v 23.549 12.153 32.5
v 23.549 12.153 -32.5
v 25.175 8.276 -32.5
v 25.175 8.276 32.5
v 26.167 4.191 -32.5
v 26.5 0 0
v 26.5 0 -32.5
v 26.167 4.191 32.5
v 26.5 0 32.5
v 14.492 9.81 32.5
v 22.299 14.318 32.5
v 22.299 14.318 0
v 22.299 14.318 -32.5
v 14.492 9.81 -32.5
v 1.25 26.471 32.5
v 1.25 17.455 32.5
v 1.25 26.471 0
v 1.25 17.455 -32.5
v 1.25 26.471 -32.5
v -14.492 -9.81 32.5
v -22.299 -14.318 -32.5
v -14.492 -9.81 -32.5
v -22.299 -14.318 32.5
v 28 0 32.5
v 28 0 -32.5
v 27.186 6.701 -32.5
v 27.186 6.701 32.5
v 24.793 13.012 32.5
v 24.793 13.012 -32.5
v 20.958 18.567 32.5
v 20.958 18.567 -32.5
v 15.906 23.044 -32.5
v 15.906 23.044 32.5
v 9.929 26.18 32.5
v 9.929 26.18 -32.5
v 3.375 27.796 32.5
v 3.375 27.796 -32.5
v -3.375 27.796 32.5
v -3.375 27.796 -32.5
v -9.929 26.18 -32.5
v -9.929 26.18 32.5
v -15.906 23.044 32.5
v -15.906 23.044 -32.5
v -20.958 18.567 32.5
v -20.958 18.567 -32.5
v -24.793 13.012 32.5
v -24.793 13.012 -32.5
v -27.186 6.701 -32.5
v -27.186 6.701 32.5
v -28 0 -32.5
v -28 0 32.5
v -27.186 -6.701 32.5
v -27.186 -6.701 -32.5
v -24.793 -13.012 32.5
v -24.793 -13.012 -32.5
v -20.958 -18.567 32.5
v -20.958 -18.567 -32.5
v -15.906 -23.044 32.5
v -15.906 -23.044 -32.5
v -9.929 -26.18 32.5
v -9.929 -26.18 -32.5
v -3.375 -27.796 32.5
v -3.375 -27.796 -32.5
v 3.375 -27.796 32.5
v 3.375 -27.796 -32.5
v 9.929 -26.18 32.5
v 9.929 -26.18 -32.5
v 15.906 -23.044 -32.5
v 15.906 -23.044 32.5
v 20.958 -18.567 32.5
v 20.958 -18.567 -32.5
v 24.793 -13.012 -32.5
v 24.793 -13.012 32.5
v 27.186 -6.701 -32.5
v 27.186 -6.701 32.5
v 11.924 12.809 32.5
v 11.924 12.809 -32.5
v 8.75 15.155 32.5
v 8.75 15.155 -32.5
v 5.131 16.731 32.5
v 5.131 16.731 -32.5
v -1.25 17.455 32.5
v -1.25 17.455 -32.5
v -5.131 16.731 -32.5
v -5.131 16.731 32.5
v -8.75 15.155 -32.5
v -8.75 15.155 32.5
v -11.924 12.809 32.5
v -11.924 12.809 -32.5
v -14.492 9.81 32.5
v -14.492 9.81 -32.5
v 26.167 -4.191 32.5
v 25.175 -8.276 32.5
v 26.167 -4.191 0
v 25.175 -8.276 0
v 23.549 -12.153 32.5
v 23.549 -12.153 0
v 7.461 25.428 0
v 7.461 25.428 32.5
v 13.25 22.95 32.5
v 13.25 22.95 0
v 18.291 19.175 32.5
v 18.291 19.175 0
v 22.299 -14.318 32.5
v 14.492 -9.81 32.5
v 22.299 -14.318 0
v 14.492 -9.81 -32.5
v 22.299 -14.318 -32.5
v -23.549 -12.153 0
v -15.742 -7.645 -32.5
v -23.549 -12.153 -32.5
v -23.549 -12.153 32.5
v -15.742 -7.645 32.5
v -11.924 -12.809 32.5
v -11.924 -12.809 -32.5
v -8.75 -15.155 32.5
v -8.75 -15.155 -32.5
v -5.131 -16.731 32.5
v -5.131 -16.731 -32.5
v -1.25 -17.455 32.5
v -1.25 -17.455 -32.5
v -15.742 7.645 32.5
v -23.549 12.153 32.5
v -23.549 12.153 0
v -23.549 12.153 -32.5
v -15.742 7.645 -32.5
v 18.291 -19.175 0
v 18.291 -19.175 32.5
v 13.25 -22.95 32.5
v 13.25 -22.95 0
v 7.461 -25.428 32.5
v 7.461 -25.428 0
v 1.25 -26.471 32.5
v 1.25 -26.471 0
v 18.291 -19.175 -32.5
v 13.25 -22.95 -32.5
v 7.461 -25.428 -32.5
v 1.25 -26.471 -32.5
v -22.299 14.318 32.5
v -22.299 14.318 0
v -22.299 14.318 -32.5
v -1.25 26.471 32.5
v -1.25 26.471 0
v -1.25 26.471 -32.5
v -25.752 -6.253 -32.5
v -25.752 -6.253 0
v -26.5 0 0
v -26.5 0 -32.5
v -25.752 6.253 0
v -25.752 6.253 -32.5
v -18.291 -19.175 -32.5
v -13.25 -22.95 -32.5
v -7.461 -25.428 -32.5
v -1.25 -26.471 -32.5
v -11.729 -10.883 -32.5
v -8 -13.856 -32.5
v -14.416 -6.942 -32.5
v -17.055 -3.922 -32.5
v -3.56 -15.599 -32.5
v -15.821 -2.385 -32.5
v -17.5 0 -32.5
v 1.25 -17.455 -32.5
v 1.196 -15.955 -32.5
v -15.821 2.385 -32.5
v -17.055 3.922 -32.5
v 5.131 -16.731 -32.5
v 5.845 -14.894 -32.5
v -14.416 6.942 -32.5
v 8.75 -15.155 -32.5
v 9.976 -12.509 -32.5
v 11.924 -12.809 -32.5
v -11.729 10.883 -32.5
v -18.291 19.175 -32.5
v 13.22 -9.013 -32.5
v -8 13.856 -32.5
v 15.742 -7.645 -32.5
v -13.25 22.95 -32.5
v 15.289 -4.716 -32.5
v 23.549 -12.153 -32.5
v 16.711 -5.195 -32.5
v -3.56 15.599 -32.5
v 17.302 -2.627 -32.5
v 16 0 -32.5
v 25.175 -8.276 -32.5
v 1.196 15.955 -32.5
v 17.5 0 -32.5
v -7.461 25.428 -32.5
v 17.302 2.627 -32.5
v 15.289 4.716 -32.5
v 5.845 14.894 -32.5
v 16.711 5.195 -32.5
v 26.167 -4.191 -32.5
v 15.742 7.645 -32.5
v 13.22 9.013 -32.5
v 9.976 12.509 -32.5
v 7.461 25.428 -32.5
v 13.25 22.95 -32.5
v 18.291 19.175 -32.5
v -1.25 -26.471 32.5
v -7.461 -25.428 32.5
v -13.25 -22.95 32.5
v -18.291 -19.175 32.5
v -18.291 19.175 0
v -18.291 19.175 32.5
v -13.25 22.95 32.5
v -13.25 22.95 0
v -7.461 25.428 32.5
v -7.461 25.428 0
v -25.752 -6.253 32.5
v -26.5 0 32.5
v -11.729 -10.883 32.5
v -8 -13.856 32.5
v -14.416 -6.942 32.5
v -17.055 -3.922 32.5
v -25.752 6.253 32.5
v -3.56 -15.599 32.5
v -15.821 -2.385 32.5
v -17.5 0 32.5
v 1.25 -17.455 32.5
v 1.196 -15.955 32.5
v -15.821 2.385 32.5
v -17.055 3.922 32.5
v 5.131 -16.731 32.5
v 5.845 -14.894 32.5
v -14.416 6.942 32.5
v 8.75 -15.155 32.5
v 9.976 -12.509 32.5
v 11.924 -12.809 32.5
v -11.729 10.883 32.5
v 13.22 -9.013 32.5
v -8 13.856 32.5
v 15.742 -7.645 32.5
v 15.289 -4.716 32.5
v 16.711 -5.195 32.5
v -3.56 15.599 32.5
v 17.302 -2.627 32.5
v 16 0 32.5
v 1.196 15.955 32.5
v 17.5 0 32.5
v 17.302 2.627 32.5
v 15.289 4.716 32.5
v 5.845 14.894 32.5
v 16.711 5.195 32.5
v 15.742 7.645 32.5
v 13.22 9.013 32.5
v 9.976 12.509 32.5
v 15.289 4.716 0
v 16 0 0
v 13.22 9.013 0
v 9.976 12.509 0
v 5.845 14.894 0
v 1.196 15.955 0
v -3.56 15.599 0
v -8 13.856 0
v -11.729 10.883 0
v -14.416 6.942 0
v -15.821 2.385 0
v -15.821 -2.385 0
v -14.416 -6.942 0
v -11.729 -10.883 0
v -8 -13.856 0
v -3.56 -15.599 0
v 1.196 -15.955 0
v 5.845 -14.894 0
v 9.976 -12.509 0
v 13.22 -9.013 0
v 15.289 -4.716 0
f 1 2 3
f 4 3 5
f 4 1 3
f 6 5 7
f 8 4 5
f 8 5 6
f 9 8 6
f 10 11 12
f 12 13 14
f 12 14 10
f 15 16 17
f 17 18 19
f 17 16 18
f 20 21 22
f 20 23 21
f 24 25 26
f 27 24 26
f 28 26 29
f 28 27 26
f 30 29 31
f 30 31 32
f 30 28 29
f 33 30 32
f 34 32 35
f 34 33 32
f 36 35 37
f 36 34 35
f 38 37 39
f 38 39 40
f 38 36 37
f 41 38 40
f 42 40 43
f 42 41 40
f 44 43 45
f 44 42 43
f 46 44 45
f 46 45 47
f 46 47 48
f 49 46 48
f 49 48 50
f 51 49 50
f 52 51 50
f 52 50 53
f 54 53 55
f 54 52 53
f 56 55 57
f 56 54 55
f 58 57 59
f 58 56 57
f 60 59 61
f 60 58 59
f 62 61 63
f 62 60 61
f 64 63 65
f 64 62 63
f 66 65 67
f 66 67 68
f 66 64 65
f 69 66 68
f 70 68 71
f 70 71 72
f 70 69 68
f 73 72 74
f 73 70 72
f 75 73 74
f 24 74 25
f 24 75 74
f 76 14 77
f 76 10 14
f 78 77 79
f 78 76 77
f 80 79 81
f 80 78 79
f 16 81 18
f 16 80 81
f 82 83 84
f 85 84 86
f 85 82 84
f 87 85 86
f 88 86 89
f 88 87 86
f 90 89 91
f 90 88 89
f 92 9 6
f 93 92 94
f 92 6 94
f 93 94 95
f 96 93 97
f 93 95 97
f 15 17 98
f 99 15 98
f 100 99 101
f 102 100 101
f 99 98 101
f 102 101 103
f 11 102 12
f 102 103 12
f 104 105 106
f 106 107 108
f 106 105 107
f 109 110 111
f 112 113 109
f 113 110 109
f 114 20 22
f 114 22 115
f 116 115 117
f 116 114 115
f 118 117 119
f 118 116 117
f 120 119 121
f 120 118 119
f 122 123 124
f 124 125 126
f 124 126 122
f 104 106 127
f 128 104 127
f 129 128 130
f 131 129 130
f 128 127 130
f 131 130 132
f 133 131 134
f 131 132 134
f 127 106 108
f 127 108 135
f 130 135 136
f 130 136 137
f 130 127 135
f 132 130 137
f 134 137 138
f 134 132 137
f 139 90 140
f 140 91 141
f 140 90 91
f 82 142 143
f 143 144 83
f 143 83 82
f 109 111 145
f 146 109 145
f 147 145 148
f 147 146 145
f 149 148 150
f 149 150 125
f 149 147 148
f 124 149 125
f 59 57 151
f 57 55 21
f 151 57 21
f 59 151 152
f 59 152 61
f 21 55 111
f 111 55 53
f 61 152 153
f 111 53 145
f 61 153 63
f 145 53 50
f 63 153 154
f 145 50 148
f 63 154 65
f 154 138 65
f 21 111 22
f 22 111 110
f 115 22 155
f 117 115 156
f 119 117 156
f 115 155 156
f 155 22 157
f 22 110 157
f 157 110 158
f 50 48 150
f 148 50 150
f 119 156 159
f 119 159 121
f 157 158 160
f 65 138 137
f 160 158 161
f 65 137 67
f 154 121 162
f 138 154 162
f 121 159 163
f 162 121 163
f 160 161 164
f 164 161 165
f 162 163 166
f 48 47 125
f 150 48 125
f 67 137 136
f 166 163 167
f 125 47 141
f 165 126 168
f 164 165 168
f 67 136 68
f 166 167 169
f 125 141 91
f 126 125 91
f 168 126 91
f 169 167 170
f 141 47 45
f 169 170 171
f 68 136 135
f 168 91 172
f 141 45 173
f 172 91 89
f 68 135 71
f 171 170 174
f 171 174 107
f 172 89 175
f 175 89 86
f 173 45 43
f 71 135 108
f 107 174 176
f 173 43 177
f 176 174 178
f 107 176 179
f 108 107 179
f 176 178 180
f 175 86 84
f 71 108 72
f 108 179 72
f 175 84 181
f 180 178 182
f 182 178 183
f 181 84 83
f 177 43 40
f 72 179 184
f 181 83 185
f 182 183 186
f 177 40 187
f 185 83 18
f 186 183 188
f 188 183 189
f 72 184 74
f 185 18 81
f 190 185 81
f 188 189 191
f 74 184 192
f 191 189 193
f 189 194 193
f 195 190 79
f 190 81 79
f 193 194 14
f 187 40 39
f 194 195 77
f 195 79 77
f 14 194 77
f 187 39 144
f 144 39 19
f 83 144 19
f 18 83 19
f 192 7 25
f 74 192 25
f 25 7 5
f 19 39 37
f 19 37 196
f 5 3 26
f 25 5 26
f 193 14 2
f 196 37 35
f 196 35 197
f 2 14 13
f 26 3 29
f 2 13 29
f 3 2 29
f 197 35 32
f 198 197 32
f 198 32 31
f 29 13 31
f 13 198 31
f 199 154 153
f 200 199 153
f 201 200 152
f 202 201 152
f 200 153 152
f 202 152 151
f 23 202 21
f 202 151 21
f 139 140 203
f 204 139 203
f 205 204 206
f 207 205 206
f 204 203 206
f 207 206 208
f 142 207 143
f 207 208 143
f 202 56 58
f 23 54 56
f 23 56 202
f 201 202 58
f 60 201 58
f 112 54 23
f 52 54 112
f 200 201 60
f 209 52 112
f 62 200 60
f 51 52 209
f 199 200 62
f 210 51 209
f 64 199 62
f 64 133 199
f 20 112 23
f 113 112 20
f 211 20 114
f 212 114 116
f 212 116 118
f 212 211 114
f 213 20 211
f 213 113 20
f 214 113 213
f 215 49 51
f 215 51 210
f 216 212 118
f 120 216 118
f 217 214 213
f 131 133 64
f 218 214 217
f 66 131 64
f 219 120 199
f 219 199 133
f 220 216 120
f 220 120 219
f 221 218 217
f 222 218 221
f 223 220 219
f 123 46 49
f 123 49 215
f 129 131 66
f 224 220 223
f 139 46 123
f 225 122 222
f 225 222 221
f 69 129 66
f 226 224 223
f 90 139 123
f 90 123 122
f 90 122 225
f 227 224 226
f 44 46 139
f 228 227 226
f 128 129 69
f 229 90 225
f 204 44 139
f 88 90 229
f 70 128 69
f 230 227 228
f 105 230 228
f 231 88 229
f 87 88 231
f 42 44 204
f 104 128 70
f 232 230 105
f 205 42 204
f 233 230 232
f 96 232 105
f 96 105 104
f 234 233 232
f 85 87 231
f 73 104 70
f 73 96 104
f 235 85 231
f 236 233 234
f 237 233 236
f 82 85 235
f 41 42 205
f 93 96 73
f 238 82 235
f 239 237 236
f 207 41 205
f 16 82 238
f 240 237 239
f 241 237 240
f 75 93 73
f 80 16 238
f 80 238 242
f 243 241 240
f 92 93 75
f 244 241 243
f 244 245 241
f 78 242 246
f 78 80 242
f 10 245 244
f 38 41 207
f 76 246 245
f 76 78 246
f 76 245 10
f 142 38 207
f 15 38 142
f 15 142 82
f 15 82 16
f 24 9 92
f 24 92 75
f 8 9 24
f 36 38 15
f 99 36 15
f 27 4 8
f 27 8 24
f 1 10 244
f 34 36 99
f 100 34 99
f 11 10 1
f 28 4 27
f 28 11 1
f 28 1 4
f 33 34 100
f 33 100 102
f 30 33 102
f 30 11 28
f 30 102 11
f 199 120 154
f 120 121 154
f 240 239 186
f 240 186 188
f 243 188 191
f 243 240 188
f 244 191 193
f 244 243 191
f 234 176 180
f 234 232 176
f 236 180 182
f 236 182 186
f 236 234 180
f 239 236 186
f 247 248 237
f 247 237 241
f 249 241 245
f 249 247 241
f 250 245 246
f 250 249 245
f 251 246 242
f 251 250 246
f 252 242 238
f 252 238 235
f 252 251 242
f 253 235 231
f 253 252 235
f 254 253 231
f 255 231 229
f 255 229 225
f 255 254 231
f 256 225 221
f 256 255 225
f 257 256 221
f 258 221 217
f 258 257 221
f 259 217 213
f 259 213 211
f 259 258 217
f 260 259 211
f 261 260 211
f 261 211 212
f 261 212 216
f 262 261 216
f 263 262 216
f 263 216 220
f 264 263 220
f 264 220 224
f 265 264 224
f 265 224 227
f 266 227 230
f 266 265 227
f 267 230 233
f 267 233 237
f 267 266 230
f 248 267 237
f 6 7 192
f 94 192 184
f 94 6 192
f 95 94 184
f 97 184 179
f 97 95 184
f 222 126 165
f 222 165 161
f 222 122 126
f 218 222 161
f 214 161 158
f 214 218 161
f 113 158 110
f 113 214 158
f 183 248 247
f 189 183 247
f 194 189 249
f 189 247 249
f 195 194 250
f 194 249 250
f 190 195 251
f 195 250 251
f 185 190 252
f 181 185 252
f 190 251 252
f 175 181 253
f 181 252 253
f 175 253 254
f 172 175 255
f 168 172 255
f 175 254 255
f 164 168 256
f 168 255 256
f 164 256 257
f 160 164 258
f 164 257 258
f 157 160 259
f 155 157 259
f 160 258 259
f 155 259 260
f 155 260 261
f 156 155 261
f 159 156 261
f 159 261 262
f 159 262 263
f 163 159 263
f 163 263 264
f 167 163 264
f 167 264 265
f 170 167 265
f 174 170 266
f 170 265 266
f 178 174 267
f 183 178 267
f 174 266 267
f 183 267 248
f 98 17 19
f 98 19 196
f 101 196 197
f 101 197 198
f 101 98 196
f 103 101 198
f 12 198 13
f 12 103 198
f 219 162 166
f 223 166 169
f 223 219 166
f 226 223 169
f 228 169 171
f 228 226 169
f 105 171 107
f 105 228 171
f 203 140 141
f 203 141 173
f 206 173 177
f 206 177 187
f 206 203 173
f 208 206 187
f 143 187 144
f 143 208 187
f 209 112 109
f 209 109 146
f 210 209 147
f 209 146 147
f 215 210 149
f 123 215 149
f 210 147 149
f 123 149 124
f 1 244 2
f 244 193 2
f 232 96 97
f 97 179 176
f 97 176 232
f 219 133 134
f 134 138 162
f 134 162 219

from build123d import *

# Parameters (mm, degrees)
F0_R     = 16
F1_DEPTH = 32.5
F0_R_2   = 28
F2_DEPTH = 32.5


with BuildPart() as f1:
    # F0 (on Top) → F1 (new body, symmetric)
    with BuildSketch(Plane.XY):
        with BuildLine():
            ThreePointArc((15.7417332781, -7.6451182726), (17.0547696022, -3.9223505474), (17.5, 0))
            ThreePointArc((17.5, 0), (17.0547696022, 3.9223505474), (15.7417332781, 7.6451182726))
            ThreePointArc((15.7417332781, 7.6451182726), (15.1554445662, 8.75), (14.4917332781, 9.8101817821))
            ThreePointArc((14.4917332781, 9.8101817821), (8.75, 15.1554445662), (1.25, 17.4553000547))
            ThreePointArc((1.25, 17.4553000547), (0, 17.5), (-1.25, 17.4553000547))
            ThreePointArc((-1.25, 17.4553000547), (-8.75, 15.1554445662), (-14.4917332781, 9.8101817821))
            ThreePointArc((-14.4917332781, 9.8101817821), (-15.1554445662, 8.75), (-15.7417332781, 7.6451182726))
            ThreePointArc((-15.7417332781, 7.6451182726), (-17.5, 0), (-15.7417332781, -7.6451182726))
            ThreePointArc((-15.7417332781, -7.6451182726), (-15.1554445662, -8.75), (-14.4917332781, -9.8101817821))
            ThreePointArc((-14.4917332781, -9.8101817821), (-8.75, -15.1554445662), (-1.25, -17.4553000547))
            ThreePointArc((-1.25, -17.4553000547), (0, -17.5), (1.25, -17.4553000547))
            ThreePointArc((1.25, -17.4553000547), (8.75, -15.1554445662), (14.4917332781, -9.8101817821))
            ThreePointArc((14.4917332781, -9.8101817821), (15.1554445662, -8.75), (15.7417332781, -7.6451182726))
        make_face()
        Circle(F0_R, mode=Mode.SUBTRACT)
    extrude(amount=F1_DEPTH, both=True)



with BuildPart() as f1b:
    # F0 (on Top) → F1, piece 2 (new body, symmetric)
    with BuildSketch(Plane.XY):
        Circle(F0_R_2)
        with BuildLine():
            ThreePointArc((22.2991275734, 14.3177829802), (22.9496732003, 13.25), (23.5491275734, 12.1527194707))
            ThreePointArc((23.5491275734, 12.1527194707), (25.751717231, 6.2529240882), (26.5, 0))
            ThreePointArc((26.5, 0), (25.751717231, -6.2529240882), (23.5491275734, -12.1527194707))
            ThreePointArc((23.5491275734, -12.1527194707), (22.9496732003, -13.25), (22.2991275734, -14.3177829802))
            ThreePointArc((22.2991275734, -14.3177829802), (13.25, -22.9496732003), (1.25, -26.4705024508))
            ThreePointArc((1.25, -26.4705024508), (0, -26.5), (-1.25, -26.4705024508))
            ThreePointArc((-1.25, -26.4705024508), (-13.25, -22.9496732003), (-22.2991275734, -14.3177829802))
            ThreePointArc((-22.2991275734, -14.3177829802), (-22.9496732003, -13.25), (-23.5491275734, -12.1527194707))
            ThreePointArc((-23.5491275734, -12.1527194707), (-26.5, 0), (-23.5491275734, 12.1527194707))
            ThreePointArc((-23.5491275734, 12.1527194707), (-22.9496732003, 13.25), (-22.2991275734, 14.3177829802))
            ThreePointArc((-22.2991275734, 14.3177829802), (-13.25, 22.9496732003), (-1.25, 26.4705024508))
            ThreePointArc((-1.25, 26.4705024508), (0, 26.5), (1.25, 26.4705024508))
            ThreePointArc((1.25, 26.4705024508), (13.25, 22.9496732003), (22.2991275734, 14.3177829802))
        make_face(mode=Mode.SUBTRACT)
    extrude(amount=F1_DEPTH, both=True)


with BuildPart() as f1_1:
    add(f1.part)

    add(f1b.part)  # F2 merges F1b
    # F0 (on Top) → F2 (join, symmetric)
    with BuildSketch(Plane.XY):
        with BuildLine():
            ThreePointArc((-15.7417332781, 7.6451182726), (-15.1554445662, 8.75), (-14.4917332781, 9.8101817821))
            Line((-14.4917332781, 9.8101817821), (-22.2991275734, 14.3177829802))
            ThreePointArc((-22.2991275734, 14.3177829802), (-22.9496732003, 13.25), (-23.5491275734, 12.1527194707))
            Line((-23.5491275734, 12.1527194707), (-15.7417332781, 7.6451182726))
        make_face()
        with BuildLine():
            ThreePointArc((-1.25, 17.4553000547), (0, 17.5), (1.25, 17.4553000547))
            Line((1.25, 17.4553000547), (1.25, 26.4705024508))
            ThreePointArc((1.25, 26.4705024508), (0, 26.5), (-1.25, 26.4705024508))
            Line((-1.25, 26.4705024508), (-1.25, 17.4553000547))
        make_face()
        with BuildLine():
            ThreePointArc((14.4917332781, 9.8101817821), (15.1554445662, 8.75), (15.7417332781, 7.6451182726))
            Line((15.7417332781, 7.6451182726), (23.5491275734, 12.1527194707))
            ThreePointArc((23.5491275734, 12.1527194707), (22.9496732003, 13.25), (22.2991275734, 14.3177829802))
            Line((22.2991275734, 14.3177829802), (14.4917332781, 9.8101817821))
        make_face()
        with BuildLine():
            Line((23.5491275734, -12.1527194707), (15.7417332781, -7.6451182726))
            ThreePointArc((15.7417332781, -7.6451182726), (15.1554445662, -8.75), (14.4917332781, -9.8101817821))
            Line((14.4917332781, -9.8101817821), (22.2991275734, -14.3177829802))
            ThreePointArc((22.2991275734, -14.3177829802), (22.9496732003, -13.25), (23.5491275734, -12.1527194707))
        make_face()
        with BuildLine():
            Line((1.25, -26.4705024508), (1.25, -17.4553000547))
            ThreePointArc((1.25, -17.4553000547), (0, -17.5), (-1.25, -17.4553000547))
            Line((-1.25, -17.4553000547), (-1.25, -26.4705024508))
            ThreePointArc((-1.25, -26.4705024508), (0, -26.5), (1.25, -26.4705024508))
        make_face()
        with BuildLine():
            Line((-22.2991275734, -14.3177829802), (-14.4917332781, -9.8101817821))
            ThreePointArc((-14.4917332781, -9.8101817821), (-15.1554445662, -8.75), (-15.7417332781, -7.6451182726))
            Line((-15.7417332781, -7.6451182726), (-23.5491275734, -12.1527194707))
            ThreePointArc((-23.5491275734, -12.1527194707), (-22.9496732003, -13.25), (-22.2991275734, -14.3177829802))
        make_face()
    extrude(amount=F2_DEPTH, both=True)


solid = f1_1.part
